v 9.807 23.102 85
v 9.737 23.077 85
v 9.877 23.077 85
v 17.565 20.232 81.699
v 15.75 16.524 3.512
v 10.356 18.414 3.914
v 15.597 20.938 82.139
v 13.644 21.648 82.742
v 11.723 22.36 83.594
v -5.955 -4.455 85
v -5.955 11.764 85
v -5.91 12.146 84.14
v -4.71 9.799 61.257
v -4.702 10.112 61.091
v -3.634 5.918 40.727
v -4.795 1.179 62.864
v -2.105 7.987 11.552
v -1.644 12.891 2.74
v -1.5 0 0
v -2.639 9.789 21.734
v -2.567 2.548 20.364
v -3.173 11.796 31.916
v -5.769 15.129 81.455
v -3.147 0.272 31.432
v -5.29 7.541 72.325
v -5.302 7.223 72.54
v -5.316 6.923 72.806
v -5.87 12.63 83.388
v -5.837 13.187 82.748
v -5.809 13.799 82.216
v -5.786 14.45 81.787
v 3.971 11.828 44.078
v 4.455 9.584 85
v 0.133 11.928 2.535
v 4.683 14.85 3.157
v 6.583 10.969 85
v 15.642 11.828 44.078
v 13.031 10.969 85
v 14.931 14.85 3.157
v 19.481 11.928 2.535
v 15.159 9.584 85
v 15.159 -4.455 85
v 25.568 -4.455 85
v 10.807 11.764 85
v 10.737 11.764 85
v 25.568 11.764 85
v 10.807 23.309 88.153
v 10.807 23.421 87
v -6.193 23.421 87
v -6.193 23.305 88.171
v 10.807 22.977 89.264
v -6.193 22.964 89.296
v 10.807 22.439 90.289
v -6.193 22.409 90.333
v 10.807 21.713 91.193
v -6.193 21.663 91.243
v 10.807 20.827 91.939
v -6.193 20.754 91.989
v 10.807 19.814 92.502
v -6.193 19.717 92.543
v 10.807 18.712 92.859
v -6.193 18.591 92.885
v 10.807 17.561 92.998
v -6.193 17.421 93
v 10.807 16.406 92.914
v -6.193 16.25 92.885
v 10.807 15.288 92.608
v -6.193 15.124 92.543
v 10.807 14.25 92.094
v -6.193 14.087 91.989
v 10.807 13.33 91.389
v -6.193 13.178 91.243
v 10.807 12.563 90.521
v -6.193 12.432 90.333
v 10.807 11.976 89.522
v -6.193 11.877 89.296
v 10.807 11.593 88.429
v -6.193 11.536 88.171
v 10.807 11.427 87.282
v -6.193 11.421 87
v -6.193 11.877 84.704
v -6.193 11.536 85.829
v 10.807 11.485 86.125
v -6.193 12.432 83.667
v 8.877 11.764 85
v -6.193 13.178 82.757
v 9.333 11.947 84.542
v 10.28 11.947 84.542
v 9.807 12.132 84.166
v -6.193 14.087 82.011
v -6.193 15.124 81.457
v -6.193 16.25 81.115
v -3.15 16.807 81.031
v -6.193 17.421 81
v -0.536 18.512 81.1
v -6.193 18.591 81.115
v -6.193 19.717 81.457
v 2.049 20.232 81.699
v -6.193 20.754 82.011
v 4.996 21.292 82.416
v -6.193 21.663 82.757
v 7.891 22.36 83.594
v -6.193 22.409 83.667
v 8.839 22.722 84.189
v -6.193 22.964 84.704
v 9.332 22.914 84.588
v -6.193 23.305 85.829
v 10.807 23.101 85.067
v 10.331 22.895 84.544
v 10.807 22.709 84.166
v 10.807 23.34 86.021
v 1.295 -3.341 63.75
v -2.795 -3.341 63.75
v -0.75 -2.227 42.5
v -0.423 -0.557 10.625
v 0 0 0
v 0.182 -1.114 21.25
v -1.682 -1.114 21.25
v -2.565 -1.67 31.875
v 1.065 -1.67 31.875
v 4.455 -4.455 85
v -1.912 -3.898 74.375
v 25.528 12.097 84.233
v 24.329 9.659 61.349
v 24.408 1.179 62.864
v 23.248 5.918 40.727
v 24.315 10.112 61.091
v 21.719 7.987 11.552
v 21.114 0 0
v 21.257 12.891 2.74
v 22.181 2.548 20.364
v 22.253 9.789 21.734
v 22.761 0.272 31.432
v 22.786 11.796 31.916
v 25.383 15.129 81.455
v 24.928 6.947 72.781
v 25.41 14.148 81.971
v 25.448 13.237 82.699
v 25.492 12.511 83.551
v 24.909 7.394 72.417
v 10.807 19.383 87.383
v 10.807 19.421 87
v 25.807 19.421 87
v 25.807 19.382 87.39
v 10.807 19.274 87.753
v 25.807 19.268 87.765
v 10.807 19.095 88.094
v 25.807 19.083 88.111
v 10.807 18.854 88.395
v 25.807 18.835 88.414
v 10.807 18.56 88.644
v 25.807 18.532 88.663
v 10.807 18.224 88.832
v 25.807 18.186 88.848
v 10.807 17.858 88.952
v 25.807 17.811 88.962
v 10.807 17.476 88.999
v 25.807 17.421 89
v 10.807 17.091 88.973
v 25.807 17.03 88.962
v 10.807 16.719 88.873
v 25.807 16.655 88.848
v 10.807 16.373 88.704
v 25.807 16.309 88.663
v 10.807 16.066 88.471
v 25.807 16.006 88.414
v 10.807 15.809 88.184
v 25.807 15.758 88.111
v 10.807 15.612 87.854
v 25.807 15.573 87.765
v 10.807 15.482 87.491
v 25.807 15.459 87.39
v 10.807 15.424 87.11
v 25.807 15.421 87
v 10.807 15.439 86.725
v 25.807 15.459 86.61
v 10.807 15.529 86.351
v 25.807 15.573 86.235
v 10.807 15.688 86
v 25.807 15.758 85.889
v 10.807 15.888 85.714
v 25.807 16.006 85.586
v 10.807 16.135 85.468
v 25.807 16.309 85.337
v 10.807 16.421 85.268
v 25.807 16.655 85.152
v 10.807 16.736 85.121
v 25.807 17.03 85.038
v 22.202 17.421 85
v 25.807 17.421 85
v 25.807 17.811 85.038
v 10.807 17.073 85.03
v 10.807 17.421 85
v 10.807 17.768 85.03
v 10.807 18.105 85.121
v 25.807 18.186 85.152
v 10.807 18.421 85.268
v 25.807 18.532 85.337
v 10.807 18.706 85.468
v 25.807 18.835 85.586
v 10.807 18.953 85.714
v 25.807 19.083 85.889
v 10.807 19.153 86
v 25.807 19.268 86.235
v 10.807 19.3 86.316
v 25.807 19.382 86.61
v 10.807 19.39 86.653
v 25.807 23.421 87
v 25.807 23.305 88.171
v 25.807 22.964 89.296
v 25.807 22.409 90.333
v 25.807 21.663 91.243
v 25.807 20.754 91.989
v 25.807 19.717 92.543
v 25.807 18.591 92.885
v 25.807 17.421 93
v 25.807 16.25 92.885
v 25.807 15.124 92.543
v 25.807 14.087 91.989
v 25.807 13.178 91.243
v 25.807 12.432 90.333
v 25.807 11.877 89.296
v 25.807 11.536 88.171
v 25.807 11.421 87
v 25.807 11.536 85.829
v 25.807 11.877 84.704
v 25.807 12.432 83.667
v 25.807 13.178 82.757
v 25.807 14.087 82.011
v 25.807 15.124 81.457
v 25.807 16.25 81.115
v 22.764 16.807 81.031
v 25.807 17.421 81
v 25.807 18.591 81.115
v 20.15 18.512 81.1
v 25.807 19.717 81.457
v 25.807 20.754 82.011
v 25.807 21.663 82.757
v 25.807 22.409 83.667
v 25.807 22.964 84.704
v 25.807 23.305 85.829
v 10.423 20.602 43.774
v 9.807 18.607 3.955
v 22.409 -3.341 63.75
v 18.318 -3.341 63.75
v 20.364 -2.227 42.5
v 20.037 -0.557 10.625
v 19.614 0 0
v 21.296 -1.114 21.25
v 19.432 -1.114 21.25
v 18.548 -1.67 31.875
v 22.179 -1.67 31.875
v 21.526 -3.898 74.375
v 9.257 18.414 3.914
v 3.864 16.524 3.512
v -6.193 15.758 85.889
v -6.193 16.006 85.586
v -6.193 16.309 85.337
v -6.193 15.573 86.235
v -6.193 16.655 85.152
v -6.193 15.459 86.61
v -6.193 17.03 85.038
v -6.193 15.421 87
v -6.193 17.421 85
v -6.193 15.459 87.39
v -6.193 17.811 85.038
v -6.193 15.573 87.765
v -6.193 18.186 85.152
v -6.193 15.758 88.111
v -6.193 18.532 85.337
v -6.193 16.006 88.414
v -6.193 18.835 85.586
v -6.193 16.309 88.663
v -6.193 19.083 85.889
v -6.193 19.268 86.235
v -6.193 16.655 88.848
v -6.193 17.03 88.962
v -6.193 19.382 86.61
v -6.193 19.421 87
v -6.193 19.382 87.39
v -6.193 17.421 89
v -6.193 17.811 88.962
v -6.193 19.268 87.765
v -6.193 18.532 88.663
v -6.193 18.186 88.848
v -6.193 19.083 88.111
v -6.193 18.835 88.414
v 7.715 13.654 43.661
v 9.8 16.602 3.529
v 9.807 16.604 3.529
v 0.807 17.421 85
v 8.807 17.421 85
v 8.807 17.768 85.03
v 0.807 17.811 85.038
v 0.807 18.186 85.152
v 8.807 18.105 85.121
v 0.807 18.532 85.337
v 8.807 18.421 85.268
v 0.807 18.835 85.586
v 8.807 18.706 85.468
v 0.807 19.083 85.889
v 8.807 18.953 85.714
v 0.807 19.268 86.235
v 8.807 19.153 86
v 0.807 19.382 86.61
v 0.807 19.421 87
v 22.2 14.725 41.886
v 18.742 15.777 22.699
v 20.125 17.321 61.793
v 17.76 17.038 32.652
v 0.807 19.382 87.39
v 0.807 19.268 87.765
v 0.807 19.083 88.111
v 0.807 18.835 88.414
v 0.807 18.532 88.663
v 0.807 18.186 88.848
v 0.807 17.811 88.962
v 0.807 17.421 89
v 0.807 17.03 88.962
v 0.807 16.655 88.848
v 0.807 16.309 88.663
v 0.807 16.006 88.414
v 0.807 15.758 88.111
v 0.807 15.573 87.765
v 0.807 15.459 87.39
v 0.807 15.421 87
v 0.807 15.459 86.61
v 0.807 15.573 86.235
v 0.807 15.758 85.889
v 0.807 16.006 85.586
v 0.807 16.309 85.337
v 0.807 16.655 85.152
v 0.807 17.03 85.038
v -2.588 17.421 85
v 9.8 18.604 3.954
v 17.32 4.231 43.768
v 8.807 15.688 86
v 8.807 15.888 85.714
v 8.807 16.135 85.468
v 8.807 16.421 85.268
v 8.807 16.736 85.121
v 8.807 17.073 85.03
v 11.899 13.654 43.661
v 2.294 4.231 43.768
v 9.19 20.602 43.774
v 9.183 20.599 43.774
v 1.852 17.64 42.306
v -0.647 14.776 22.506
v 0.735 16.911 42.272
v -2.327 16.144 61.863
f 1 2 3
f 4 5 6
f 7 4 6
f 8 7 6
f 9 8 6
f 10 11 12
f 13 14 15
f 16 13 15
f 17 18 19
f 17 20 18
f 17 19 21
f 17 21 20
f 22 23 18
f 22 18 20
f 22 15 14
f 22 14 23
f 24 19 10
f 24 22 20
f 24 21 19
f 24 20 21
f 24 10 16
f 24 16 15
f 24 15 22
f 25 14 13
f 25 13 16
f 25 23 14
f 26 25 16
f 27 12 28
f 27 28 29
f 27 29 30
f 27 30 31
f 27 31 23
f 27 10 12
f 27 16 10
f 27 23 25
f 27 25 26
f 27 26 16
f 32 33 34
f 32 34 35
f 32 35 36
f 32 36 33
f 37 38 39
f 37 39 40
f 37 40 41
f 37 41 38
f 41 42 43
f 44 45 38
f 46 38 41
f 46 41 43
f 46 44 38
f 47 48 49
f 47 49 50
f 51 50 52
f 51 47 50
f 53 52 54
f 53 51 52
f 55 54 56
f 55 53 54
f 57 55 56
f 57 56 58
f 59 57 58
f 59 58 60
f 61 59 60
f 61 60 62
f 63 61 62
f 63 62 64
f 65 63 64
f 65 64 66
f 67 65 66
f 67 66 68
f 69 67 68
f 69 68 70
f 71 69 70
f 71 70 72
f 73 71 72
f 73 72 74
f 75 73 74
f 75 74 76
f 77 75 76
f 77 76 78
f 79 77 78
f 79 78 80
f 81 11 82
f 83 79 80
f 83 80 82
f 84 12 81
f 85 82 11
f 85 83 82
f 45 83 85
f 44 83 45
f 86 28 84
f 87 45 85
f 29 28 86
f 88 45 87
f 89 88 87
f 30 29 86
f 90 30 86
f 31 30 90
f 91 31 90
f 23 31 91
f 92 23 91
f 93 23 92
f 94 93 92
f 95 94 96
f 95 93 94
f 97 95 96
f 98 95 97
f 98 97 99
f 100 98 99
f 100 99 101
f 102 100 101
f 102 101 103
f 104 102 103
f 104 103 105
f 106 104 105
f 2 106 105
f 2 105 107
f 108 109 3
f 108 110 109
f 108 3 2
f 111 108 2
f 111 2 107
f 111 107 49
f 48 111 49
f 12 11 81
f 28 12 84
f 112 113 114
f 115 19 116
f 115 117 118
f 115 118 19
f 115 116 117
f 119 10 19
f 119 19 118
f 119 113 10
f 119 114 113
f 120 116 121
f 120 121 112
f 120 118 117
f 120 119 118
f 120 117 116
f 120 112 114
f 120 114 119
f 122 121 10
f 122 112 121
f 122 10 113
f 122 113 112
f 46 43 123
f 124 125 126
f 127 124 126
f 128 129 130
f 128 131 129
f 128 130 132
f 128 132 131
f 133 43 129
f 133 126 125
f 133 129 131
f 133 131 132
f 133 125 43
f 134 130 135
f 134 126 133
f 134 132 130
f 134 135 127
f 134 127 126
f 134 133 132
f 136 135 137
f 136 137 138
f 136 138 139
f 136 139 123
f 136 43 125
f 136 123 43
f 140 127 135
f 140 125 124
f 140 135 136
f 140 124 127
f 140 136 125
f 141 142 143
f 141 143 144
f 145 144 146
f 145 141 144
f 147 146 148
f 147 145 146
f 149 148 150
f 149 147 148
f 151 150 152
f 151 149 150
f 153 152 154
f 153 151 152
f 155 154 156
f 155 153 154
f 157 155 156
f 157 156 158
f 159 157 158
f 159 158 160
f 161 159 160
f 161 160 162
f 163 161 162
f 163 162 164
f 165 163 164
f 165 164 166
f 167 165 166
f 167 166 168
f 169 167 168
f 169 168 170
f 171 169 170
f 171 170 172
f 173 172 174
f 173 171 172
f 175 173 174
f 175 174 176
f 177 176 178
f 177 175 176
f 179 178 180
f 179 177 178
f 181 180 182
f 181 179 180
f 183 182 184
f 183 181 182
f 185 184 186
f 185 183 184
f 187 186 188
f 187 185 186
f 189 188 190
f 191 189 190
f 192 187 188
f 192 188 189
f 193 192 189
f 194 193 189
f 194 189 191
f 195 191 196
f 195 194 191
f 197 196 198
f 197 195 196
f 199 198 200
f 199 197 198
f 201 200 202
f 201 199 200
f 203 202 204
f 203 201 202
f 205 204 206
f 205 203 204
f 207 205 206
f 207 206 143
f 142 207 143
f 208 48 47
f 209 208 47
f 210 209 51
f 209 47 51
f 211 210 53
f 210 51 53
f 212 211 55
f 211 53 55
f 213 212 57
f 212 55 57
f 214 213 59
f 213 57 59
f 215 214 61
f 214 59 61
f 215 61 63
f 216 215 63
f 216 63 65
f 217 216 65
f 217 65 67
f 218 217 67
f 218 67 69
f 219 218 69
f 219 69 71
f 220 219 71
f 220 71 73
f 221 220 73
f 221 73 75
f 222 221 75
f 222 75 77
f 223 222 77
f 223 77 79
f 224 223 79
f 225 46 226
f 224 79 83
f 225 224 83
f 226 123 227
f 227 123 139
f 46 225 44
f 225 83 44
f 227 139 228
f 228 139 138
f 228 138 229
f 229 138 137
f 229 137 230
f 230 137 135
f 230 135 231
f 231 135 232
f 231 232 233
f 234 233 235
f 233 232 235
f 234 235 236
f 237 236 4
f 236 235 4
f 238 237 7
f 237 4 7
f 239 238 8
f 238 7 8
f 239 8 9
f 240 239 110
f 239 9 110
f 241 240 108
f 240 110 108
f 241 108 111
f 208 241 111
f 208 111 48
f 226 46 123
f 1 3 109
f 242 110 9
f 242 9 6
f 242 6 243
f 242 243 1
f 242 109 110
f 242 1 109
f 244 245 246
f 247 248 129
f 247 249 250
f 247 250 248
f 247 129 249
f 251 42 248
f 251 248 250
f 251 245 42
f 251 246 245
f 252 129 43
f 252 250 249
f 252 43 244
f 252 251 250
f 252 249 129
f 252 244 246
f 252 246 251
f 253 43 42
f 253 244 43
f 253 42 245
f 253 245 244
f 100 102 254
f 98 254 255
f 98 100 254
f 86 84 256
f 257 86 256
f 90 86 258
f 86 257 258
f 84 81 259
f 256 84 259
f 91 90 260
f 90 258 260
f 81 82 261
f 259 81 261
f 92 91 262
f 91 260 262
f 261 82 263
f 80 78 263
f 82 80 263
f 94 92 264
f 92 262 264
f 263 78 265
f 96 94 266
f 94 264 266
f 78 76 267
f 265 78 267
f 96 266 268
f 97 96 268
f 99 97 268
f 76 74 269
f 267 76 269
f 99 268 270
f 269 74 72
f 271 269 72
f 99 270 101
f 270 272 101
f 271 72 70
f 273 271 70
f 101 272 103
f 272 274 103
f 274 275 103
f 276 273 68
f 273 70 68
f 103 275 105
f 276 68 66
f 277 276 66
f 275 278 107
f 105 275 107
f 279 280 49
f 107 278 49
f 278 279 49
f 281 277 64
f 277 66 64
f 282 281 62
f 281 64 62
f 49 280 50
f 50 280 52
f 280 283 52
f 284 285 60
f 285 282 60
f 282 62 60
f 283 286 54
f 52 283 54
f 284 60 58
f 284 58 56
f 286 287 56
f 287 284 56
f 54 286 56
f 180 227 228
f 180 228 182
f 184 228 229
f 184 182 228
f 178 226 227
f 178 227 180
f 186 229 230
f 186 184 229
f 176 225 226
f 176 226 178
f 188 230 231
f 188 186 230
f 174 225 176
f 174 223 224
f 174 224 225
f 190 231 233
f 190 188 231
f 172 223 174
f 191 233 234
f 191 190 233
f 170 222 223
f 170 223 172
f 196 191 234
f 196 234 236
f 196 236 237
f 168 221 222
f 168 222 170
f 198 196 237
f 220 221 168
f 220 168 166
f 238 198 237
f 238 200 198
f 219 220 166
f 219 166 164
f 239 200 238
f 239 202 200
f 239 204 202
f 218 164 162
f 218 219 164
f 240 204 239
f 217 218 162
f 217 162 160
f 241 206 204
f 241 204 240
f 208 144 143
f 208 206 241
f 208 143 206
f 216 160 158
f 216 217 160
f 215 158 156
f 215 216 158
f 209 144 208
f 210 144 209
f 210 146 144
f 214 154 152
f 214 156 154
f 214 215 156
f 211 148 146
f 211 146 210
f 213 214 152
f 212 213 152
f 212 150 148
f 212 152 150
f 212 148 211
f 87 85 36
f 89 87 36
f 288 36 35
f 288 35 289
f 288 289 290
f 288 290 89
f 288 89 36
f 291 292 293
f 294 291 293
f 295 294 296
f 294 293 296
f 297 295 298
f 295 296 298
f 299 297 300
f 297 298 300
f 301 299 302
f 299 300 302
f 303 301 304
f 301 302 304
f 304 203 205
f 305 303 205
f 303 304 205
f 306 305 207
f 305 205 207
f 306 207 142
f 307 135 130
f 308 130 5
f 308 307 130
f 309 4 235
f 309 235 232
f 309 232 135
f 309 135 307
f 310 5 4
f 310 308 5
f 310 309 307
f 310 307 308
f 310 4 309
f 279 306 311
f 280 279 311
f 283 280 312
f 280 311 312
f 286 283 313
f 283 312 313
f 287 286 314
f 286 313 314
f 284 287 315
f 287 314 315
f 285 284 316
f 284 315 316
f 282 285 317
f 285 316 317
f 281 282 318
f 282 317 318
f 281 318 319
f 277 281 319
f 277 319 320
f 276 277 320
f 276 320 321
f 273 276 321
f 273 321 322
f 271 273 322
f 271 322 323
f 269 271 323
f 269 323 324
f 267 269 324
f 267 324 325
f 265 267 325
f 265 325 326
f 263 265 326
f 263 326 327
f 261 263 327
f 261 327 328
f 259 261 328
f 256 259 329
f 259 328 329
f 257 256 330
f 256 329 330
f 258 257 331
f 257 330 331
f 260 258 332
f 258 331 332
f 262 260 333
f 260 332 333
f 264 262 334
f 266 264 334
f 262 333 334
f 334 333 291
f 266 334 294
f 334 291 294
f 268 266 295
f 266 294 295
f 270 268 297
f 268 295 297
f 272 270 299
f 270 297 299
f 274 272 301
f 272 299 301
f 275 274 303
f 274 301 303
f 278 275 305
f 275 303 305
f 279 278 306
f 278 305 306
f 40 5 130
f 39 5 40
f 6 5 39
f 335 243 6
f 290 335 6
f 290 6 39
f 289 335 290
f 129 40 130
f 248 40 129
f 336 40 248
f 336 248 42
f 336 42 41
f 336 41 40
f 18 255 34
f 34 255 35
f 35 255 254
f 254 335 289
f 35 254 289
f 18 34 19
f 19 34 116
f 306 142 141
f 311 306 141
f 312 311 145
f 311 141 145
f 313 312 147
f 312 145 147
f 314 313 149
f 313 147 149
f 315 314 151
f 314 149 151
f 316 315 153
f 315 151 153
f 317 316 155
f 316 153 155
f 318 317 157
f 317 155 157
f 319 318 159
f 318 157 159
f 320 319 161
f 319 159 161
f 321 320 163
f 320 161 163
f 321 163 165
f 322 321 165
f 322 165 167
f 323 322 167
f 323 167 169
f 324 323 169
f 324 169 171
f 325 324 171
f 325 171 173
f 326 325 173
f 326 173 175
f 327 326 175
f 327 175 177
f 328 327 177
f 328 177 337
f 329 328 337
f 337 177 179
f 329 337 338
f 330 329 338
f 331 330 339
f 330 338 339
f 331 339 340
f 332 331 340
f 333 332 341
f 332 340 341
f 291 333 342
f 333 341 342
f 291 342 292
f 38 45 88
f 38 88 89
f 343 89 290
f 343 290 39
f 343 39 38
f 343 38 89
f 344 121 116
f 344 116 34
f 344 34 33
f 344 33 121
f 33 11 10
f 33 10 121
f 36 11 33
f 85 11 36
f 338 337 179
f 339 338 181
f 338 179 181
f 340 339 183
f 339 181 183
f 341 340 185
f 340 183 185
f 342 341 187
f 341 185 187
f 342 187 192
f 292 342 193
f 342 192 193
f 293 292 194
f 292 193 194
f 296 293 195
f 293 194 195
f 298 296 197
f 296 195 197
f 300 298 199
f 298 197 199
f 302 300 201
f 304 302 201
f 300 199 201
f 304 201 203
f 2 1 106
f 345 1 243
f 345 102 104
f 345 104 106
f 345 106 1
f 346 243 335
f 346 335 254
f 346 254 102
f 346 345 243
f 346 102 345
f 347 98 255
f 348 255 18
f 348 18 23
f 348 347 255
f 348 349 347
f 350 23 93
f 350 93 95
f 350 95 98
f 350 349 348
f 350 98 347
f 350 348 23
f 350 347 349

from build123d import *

# Parameters (mm, degrees)
F2_DEPTH       = 85
F2_TAPER       = -3
F4_DEPTH       = 1
F5_R           = 6
F5_R_2         = 2
F6_DEPTH       = 15
F6_DEPTH_BACK  = 17
F7_R           = 2
F8_DEPTH       = 25
F11_DEPTH      = 25
F11_DEPTH_BACK = 25


with BuildPart() as f2:
    # F0 (on Top) → F2 (new body)
    with BuildSketch(Plane.XY):
        Polygon((-1.5, 0), (0, 0), (0, 12), (4.6097722286, 15), (9.8068868127, 16.8), (15.0040013968, 15), (19.6137736254, 12), (19.6137736254, 0), (21.1137736254, 0), (21.1137736254, 12.8134892168), (15.668347165, 16.357325782), (10.2892993427, 18.2203376367), (9.8068868127, 18.3874193009), (9.3244742827, 18.2203376367), (3.9454264604, 16.357325782), (-1.5, 12.8134892168), align=None)
    extrude(amount=F2_DEPTH, taper=F2_TAPER)

    # F3 (on face) → F4 (join)
    with BuildSketch(Plane.XY.offset(85)):
        Polygon((8.8068868127, 12.08572318), (9.8068868127, 12.08572318), (10.8068868127, 12.08572318), (10.8068868127, 22.7553500917), (8.8068868127, 22.7553500917), align=None)
    extrude(amount=F4_DEPTH)

    # F5 (on face) → F6 (join, two sides)
    with BuildSketch(Plane.YZ.offset(10.8068868127)) as f6_sk:
        with Locations((17.4205366358, 87)):
            Circle(F5_R)
        with Locations((17.4205366358, 87)):
            Circle(F5_R_2, mode=Mode.SUBTRACT)
    extrude(amount=F6_DEPTH)
    extrude(f6_sk.sketch, amount=-F6_DEPTH_BACK)

    # F7 (on face) → F8 (cut)
    with BuildSketch(Plane.YZ.offset(25.8068868127)):
        with Locations((17.4205366358, 87)):
            Circle(F7_R)
    extrude(amount=-F8_DEPTH, mode=Mode.SUBTRACT)

    # F10 (on offset) → F11 (cut, two sides)
    with BuildSketch(Plane.YZ.offset(9.8)) as f11_sk:
        Polygon((20.4148828708, 4.3393173099), (0, 0), (20.4148828708, 0), align=None)
    extrude(amount=-F11_DEPTH, mode=Mode.SUBTRACT)
    extrude(f11_sk.sketch, amount=F11_DEPTH_BACK, mode=Mode.SUBTRACT)


solid = f2.part
